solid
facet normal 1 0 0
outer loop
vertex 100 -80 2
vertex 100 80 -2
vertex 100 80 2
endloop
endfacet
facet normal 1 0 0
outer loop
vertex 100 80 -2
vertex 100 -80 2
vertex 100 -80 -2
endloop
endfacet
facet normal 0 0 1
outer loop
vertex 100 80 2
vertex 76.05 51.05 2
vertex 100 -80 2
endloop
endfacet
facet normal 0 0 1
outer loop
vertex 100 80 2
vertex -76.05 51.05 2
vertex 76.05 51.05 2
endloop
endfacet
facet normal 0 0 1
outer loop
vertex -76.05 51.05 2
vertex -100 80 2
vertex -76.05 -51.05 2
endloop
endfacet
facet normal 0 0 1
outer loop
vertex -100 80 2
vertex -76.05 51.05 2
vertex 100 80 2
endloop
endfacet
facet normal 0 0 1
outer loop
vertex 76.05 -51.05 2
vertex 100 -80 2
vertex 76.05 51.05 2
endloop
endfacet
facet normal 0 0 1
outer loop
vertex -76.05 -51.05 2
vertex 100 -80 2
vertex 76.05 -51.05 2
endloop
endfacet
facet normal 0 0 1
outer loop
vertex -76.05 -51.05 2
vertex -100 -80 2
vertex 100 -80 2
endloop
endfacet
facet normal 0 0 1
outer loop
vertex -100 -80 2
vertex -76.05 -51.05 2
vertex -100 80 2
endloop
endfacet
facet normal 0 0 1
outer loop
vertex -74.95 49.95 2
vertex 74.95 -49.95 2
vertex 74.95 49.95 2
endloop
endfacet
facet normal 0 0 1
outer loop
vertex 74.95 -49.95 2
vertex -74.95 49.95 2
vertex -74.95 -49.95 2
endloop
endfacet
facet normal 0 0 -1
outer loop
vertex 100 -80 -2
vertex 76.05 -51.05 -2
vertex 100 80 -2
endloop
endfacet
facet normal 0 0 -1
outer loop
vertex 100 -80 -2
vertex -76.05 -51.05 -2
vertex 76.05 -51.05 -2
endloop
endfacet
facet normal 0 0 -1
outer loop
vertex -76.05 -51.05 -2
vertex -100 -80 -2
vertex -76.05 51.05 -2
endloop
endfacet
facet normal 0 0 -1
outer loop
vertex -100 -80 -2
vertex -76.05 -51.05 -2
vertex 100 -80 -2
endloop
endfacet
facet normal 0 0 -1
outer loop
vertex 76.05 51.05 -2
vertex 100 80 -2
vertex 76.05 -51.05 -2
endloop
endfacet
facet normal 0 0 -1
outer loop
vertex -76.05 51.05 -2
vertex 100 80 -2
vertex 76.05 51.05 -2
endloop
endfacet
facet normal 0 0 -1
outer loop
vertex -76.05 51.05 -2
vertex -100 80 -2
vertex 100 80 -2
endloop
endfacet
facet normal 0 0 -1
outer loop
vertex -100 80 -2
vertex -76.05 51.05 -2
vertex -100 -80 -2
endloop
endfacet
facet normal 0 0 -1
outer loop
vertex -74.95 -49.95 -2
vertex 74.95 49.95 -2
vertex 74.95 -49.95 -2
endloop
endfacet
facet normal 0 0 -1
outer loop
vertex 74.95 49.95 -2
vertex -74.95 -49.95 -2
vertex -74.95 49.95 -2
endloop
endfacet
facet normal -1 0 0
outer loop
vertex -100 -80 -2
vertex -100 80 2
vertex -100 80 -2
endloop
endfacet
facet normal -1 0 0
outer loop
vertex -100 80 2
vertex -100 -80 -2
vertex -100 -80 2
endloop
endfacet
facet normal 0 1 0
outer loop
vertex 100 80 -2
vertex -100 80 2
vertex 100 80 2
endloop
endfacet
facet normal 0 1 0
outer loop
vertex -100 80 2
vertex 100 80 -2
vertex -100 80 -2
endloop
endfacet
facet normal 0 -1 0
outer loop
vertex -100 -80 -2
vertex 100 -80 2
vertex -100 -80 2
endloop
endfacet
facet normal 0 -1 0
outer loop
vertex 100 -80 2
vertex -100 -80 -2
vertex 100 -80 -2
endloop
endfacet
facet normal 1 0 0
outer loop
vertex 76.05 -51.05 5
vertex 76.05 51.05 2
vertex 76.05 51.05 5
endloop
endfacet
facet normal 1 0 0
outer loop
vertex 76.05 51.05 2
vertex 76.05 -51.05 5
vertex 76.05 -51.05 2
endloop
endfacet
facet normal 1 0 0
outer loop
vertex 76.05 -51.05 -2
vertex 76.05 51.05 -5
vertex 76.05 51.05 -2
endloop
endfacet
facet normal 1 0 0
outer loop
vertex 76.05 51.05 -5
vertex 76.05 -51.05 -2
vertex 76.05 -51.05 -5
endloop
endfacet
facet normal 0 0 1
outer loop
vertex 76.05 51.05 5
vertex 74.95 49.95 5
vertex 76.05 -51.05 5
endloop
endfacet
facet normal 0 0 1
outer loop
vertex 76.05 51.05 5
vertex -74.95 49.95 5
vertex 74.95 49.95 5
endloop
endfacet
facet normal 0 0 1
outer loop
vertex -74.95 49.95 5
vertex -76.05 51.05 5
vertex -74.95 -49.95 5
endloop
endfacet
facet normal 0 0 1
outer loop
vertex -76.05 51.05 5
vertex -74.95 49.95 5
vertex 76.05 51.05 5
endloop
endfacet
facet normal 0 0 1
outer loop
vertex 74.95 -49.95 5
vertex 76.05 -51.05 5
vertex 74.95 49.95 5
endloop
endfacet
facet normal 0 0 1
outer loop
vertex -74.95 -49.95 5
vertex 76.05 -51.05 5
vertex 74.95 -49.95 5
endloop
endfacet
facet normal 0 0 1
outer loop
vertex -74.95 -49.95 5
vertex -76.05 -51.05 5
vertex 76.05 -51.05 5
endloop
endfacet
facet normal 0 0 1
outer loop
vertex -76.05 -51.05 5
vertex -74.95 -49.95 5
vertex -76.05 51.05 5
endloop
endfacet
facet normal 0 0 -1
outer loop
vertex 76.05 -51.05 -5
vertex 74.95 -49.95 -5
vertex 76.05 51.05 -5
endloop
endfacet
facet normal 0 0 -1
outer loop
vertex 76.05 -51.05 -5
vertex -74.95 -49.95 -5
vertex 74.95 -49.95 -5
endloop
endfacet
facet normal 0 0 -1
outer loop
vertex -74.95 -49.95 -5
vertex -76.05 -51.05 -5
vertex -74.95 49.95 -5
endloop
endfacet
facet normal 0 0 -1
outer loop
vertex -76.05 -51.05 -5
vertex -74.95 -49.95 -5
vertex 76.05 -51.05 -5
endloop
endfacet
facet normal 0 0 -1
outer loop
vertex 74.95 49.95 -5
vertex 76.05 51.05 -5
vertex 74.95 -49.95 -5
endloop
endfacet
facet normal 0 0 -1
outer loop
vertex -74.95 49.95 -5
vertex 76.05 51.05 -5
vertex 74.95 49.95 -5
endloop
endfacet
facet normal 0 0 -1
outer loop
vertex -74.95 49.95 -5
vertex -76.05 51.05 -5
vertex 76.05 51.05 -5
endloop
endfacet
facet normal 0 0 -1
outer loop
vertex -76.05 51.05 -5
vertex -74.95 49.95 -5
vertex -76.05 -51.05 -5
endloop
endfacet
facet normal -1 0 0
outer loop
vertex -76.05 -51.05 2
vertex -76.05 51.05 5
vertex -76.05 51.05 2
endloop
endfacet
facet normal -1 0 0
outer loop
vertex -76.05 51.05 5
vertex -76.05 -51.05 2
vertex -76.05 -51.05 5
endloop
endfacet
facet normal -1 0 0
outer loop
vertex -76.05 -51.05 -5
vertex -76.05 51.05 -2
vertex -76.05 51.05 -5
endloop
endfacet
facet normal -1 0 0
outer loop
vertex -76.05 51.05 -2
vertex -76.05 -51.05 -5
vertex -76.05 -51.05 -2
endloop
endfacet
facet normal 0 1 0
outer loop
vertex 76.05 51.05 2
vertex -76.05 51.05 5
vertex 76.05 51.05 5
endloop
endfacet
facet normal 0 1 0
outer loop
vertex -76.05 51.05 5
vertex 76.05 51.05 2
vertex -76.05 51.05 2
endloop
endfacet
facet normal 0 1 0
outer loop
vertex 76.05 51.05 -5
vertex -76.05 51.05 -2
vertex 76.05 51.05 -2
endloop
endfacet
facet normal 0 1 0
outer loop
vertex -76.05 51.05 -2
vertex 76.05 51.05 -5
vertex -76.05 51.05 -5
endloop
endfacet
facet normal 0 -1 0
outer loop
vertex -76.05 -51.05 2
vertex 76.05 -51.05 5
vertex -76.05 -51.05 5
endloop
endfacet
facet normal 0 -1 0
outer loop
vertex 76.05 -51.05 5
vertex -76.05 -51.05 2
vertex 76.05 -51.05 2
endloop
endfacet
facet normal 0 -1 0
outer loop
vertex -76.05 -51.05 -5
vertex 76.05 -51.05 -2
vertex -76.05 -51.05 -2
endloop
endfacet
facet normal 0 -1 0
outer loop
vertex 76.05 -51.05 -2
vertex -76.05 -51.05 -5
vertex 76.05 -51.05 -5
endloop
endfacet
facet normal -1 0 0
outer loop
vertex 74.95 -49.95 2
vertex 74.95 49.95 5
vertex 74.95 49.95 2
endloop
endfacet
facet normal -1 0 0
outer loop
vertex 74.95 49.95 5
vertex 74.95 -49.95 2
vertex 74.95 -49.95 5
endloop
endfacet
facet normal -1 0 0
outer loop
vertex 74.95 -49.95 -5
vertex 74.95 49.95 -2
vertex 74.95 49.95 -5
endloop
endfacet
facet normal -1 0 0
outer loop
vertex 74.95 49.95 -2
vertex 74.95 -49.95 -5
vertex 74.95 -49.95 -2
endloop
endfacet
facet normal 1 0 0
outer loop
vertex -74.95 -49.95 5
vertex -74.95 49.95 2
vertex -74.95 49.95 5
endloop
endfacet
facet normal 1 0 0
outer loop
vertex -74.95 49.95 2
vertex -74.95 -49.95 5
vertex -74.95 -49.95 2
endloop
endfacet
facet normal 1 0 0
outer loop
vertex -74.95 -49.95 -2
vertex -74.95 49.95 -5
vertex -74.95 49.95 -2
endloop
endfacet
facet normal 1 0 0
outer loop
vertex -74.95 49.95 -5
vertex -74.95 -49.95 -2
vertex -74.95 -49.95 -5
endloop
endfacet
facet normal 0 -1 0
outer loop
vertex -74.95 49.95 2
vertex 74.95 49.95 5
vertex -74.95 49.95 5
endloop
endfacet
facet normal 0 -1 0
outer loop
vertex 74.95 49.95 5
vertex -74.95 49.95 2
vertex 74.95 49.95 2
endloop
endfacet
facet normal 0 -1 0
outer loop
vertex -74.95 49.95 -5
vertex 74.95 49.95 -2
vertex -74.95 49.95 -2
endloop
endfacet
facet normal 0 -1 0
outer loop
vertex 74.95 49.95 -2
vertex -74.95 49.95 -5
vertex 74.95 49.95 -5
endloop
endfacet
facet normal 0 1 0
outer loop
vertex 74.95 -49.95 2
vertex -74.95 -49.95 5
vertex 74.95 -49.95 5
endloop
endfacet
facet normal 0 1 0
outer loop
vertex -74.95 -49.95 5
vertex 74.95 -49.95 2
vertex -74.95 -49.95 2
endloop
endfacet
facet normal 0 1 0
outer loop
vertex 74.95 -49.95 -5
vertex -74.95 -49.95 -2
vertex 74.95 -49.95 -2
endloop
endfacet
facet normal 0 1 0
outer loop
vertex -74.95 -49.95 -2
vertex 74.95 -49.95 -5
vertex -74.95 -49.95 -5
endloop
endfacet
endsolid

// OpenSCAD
file = "";
difference() {
    union() {
        cube([200, 160, 4], center = true);
    }
    translate([-75, -50, 0])
    linear_extrude(10, center = true, convexity = 3)
        import(file);
}

color("black") difference() {
    cube([152.1, 102.1, 10], center = true);
    cube([149.9, 99.9, 12], center = true);
}
